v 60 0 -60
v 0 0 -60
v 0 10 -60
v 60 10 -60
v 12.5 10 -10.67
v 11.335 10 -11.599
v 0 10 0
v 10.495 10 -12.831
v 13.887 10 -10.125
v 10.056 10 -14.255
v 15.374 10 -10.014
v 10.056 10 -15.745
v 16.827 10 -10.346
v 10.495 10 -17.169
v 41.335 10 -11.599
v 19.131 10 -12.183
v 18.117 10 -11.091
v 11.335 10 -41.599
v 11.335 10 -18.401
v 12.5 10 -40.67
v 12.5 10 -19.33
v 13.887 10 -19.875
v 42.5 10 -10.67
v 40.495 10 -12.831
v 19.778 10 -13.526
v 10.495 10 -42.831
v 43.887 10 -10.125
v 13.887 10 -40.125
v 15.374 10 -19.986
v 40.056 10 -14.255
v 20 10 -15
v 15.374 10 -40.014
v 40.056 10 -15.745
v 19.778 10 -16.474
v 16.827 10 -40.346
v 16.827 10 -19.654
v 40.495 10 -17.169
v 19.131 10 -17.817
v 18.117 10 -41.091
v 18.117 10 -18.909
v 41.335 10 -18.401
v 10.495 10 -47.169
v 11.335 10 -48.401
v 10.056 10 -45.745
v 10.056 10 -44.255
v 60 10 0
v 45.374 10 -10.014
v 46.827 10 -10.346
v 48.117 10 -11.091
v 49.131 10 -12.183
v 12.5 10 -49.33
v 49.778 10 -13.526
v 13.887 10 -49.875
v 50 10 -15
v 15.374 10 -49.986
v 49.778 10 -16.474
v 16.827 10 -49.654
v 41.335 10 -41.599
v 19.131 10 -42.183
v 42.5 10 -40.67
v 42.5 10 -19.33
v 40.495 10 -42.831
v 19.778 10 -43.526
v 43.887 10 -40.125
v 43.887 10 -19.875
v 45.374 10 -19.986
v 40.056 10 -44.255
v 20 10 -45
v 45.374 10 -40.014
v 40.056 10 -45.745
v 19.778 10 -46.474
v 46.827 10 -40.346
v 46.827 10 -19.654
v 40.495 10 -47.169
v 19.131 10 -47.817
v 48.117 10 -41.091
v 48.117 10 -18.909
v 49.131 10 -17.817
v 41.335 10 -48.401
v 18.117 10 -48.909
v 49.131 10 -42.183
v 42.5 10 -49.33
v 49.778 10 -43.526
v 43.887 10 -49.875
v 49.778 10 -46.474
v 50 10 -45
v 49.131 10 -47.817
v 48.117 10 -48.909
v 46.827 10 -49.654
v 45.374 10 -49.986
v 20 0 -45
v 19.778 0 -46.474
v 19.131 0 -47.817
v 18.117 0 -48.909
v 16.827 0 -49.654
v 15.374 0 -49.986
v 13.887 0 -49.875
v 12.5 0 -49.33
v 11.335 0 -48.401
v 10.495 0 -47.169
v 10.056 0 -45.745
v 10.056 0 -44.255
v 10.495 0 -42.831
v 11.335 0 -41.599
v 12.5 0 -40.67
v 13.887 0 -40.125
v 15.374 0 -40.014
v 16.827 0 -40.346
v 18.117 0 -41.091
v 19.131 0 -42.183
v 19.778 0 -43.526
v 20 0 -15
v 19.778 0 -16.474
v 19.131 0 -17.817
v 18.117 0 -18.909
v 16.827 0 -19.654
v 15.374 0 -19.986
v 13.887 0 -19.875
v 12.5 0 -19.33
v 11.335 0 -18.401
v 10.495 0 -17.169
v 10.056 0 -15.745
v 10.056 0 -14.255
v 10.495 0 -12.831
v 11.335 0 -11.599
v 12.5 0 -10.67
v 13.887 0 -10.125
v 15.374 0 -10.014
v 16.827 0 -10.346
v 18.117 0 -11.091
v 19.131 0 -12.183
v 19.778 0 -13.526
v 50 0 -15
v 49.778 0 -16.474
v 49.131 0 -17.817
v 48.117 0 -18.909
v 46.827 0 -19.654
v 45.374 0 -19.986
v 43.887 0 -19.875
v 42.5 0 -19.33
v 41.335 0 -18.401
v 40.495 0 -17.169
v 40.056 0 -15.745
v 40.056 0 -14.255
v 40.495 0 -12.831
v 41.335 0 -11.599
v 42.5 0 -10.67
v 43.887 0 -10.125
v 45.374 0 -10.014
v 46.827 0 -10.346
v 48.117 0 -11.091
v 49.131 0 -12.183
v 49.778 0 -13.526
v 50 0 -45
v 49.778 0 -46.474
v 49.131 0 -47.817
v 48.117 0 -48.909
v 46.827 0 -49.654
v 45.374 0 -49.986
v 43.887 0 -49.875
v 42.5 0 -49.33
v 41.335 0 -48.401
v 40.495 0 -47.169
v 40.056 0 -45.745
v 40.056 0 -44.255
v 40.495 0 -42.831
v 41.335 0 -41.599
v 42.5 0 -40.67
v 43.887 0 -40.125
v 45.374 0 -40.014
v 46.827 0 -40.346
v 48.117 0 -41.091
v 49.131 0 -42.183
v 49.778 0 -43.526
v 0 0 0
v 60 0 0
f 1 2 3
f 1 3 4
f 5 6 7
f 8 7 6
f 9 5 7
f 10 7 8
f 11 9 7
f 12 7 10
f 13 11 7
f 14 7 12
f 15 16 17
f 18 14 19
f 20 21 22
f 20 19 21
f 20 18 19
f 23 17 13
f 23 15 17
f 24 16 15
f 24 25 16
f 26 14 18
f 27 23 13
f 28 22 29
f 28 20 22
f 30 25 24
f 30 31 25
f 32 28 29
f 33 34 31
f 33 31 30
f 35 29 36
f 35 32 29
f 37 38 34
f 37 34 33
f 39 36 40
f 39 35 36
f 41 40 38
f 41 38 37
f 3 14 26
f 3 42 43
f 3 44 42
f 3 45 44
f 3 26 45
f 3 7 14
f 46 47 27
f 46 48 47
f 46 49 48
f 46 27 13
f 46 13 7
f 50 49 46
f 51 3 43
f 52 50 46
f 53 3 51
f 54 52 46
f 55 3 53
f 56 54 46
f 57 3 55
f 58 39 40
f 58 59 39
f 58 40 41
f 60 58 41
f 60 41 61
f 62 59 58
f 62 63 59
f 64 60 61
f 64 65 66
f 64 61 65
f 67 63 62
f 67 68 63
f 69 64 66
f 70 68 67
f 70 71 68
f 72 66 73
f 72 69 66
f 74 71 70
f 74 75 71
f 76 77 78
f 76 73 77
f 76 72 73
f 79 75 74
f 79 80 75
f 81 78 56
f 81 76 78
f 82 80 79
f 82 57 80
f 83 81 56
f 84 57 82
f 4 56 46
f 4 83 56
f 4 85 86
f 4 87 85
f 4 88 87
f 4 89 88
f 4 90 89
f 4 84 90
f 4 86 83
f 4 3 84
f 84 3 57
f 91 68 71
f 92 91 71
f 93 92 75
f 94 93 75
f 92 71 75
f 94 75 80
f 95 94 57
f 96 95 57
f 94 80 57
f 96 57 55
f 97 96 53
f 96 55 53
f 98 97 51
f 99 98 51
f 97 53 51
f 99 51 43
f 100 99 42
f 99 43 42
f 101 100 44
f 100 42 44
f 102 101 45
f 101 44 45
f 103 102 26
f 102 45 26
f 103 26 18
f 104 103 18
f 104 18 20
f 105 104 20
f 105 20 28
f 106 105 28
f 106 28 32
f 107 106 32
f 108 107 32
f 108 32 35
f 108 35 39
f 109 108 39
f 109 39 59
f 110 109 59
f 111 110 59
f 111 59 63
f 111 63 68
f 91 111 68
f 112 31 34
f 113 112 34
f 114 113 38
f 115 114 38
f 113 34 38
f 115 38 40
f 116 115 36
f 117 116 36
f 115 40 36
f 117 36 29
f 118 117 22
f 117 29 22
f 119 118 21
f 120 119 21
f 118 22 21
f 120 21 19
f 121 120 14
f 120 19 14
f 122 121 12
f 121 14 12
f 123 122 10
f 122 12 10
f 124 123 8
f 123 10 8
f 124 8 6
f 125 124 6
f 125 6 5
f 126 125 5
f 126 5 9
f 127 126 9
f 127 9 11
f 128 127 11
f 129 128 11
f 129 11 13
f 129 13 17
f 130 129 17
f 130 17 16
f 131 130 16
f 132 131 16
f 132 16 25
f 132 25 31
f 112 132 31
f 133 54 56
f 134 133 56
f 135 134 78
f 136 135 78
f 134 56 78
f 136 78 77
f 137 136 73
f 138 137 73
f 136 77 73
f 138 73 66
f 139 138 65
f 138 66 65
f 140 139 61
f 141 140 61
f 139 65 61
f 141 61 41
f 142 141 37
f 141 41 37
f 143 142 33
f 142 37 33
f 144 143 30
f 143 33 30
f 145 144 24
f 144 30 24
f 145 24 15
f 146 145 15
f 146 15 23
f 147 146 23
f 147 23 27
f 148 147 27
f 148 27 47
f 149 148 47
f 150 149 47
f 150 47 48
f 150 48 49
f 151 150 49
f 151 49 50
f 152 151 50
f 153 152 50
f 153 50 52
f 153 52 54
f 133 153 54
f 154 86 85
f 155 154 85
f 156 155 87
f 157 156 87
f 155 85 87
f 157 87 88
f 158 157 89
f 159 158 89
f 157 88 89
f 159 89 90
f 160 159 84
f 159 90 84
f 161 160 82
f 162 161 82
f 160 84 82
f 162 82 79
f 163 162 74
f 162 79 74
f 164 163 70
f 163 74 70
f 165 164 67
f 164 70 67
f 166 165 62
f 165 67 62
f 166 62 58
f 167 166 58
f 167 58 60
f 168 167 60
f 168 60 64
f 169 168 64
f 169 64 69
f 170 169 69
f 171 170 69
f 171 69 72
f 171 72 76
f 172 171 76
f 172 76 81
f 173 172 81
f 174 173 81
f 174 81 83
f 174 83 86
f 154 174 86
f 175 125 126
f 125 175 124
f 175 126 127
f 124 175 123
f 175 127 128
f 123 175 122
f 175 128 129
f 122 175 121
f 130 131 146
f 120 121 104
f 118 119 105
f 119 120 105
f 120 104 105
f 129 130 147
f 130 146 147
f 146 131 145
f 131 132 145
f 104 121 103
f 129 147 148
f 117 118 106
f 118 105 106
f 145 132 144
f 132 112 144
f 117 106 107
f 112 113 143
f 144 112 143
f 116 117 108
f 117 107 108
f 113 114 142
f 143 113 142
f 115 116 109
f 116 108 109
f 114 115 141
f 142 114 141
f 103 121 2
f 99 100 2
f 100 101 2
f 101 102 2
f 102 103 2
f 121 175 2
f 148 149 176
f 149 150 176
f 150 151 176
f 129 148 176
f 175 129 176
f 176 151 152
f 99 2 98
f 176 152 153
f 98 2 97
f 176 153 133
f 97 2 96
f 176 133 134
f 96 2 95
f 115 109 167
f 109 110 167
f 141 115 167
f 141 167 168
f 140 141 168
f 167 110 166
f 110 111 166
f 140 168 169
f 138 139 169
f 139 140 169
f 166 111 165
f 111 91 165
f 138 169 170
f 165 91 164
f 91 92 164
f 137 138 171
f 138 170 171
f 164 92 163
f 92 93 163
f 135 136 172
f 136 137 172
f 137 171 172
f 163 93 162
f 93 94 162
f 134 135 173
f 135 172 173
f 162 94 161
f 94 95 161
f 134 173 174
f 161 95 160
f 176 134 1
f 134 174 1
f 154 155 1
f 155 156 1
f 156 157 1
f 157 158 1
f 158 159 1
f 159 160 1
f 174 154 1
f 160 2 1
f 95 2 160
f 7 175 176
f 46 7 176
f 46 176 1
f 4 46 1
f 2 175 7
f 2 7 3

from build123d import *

# Parameters (mm, degrees)
SKETCH1_W            = 60
SKETCH1_H            = 60
BOSS_EXTRUDE1_DEPTH  = 10
SKETCH2_R            = 5
CUT_EXTRUDE1_DEPTH   = 11
LPATTERN1_COUNT      = 4
LPATTERN1_PITCH      = 30
LPATTERN1_COUNT_DIR2 = 4
LPATTERN1_PITCH_DIR2 = 30


with BuildPart() as part:
    # Sketch1 → Boss-Extrude1 (new body)
    with BuildSketch(Plane(origin=(0, 0, 0), x_dir=(1, 0, 0), z_dir=(0, 1, 0))):
        with Locations((30, 30)):
            Rectangle(SKETCH1_W, SKETCH1_H)
    extrude(amount=BOSS_EXTRUDE1_DEPTH)

    # Sketch2 → Cut-Extrude1 (cut, through all)
    with BuildSketch(Plane(origin=(0, 10, 0), x_dir=(1, 0, 0), z_dir=(0, 1, 0))):
        with Locations((15, 15)):
            Circle(SKETCH2_R)
    cut_extrude1 = extrude(amount=-CUT_EXTRUDE1_DEPTH, mode=Mode.SUBTRACT)

    # LPattern1: Cut-Extrude1 4 × 4
    with Locations(*[(i * LPATTERN1_PITCH, 0, -j * LPATTERN1_PITCH_DIR2) for i in range(LPATTERN1_COUNT) for j in range(LPATTERN1_COUNT_DIR2) if (i, j) != (0, 0)]):
        add(cut_extrude1, mode=Mode.SUBTRACT)


solid = part.part
